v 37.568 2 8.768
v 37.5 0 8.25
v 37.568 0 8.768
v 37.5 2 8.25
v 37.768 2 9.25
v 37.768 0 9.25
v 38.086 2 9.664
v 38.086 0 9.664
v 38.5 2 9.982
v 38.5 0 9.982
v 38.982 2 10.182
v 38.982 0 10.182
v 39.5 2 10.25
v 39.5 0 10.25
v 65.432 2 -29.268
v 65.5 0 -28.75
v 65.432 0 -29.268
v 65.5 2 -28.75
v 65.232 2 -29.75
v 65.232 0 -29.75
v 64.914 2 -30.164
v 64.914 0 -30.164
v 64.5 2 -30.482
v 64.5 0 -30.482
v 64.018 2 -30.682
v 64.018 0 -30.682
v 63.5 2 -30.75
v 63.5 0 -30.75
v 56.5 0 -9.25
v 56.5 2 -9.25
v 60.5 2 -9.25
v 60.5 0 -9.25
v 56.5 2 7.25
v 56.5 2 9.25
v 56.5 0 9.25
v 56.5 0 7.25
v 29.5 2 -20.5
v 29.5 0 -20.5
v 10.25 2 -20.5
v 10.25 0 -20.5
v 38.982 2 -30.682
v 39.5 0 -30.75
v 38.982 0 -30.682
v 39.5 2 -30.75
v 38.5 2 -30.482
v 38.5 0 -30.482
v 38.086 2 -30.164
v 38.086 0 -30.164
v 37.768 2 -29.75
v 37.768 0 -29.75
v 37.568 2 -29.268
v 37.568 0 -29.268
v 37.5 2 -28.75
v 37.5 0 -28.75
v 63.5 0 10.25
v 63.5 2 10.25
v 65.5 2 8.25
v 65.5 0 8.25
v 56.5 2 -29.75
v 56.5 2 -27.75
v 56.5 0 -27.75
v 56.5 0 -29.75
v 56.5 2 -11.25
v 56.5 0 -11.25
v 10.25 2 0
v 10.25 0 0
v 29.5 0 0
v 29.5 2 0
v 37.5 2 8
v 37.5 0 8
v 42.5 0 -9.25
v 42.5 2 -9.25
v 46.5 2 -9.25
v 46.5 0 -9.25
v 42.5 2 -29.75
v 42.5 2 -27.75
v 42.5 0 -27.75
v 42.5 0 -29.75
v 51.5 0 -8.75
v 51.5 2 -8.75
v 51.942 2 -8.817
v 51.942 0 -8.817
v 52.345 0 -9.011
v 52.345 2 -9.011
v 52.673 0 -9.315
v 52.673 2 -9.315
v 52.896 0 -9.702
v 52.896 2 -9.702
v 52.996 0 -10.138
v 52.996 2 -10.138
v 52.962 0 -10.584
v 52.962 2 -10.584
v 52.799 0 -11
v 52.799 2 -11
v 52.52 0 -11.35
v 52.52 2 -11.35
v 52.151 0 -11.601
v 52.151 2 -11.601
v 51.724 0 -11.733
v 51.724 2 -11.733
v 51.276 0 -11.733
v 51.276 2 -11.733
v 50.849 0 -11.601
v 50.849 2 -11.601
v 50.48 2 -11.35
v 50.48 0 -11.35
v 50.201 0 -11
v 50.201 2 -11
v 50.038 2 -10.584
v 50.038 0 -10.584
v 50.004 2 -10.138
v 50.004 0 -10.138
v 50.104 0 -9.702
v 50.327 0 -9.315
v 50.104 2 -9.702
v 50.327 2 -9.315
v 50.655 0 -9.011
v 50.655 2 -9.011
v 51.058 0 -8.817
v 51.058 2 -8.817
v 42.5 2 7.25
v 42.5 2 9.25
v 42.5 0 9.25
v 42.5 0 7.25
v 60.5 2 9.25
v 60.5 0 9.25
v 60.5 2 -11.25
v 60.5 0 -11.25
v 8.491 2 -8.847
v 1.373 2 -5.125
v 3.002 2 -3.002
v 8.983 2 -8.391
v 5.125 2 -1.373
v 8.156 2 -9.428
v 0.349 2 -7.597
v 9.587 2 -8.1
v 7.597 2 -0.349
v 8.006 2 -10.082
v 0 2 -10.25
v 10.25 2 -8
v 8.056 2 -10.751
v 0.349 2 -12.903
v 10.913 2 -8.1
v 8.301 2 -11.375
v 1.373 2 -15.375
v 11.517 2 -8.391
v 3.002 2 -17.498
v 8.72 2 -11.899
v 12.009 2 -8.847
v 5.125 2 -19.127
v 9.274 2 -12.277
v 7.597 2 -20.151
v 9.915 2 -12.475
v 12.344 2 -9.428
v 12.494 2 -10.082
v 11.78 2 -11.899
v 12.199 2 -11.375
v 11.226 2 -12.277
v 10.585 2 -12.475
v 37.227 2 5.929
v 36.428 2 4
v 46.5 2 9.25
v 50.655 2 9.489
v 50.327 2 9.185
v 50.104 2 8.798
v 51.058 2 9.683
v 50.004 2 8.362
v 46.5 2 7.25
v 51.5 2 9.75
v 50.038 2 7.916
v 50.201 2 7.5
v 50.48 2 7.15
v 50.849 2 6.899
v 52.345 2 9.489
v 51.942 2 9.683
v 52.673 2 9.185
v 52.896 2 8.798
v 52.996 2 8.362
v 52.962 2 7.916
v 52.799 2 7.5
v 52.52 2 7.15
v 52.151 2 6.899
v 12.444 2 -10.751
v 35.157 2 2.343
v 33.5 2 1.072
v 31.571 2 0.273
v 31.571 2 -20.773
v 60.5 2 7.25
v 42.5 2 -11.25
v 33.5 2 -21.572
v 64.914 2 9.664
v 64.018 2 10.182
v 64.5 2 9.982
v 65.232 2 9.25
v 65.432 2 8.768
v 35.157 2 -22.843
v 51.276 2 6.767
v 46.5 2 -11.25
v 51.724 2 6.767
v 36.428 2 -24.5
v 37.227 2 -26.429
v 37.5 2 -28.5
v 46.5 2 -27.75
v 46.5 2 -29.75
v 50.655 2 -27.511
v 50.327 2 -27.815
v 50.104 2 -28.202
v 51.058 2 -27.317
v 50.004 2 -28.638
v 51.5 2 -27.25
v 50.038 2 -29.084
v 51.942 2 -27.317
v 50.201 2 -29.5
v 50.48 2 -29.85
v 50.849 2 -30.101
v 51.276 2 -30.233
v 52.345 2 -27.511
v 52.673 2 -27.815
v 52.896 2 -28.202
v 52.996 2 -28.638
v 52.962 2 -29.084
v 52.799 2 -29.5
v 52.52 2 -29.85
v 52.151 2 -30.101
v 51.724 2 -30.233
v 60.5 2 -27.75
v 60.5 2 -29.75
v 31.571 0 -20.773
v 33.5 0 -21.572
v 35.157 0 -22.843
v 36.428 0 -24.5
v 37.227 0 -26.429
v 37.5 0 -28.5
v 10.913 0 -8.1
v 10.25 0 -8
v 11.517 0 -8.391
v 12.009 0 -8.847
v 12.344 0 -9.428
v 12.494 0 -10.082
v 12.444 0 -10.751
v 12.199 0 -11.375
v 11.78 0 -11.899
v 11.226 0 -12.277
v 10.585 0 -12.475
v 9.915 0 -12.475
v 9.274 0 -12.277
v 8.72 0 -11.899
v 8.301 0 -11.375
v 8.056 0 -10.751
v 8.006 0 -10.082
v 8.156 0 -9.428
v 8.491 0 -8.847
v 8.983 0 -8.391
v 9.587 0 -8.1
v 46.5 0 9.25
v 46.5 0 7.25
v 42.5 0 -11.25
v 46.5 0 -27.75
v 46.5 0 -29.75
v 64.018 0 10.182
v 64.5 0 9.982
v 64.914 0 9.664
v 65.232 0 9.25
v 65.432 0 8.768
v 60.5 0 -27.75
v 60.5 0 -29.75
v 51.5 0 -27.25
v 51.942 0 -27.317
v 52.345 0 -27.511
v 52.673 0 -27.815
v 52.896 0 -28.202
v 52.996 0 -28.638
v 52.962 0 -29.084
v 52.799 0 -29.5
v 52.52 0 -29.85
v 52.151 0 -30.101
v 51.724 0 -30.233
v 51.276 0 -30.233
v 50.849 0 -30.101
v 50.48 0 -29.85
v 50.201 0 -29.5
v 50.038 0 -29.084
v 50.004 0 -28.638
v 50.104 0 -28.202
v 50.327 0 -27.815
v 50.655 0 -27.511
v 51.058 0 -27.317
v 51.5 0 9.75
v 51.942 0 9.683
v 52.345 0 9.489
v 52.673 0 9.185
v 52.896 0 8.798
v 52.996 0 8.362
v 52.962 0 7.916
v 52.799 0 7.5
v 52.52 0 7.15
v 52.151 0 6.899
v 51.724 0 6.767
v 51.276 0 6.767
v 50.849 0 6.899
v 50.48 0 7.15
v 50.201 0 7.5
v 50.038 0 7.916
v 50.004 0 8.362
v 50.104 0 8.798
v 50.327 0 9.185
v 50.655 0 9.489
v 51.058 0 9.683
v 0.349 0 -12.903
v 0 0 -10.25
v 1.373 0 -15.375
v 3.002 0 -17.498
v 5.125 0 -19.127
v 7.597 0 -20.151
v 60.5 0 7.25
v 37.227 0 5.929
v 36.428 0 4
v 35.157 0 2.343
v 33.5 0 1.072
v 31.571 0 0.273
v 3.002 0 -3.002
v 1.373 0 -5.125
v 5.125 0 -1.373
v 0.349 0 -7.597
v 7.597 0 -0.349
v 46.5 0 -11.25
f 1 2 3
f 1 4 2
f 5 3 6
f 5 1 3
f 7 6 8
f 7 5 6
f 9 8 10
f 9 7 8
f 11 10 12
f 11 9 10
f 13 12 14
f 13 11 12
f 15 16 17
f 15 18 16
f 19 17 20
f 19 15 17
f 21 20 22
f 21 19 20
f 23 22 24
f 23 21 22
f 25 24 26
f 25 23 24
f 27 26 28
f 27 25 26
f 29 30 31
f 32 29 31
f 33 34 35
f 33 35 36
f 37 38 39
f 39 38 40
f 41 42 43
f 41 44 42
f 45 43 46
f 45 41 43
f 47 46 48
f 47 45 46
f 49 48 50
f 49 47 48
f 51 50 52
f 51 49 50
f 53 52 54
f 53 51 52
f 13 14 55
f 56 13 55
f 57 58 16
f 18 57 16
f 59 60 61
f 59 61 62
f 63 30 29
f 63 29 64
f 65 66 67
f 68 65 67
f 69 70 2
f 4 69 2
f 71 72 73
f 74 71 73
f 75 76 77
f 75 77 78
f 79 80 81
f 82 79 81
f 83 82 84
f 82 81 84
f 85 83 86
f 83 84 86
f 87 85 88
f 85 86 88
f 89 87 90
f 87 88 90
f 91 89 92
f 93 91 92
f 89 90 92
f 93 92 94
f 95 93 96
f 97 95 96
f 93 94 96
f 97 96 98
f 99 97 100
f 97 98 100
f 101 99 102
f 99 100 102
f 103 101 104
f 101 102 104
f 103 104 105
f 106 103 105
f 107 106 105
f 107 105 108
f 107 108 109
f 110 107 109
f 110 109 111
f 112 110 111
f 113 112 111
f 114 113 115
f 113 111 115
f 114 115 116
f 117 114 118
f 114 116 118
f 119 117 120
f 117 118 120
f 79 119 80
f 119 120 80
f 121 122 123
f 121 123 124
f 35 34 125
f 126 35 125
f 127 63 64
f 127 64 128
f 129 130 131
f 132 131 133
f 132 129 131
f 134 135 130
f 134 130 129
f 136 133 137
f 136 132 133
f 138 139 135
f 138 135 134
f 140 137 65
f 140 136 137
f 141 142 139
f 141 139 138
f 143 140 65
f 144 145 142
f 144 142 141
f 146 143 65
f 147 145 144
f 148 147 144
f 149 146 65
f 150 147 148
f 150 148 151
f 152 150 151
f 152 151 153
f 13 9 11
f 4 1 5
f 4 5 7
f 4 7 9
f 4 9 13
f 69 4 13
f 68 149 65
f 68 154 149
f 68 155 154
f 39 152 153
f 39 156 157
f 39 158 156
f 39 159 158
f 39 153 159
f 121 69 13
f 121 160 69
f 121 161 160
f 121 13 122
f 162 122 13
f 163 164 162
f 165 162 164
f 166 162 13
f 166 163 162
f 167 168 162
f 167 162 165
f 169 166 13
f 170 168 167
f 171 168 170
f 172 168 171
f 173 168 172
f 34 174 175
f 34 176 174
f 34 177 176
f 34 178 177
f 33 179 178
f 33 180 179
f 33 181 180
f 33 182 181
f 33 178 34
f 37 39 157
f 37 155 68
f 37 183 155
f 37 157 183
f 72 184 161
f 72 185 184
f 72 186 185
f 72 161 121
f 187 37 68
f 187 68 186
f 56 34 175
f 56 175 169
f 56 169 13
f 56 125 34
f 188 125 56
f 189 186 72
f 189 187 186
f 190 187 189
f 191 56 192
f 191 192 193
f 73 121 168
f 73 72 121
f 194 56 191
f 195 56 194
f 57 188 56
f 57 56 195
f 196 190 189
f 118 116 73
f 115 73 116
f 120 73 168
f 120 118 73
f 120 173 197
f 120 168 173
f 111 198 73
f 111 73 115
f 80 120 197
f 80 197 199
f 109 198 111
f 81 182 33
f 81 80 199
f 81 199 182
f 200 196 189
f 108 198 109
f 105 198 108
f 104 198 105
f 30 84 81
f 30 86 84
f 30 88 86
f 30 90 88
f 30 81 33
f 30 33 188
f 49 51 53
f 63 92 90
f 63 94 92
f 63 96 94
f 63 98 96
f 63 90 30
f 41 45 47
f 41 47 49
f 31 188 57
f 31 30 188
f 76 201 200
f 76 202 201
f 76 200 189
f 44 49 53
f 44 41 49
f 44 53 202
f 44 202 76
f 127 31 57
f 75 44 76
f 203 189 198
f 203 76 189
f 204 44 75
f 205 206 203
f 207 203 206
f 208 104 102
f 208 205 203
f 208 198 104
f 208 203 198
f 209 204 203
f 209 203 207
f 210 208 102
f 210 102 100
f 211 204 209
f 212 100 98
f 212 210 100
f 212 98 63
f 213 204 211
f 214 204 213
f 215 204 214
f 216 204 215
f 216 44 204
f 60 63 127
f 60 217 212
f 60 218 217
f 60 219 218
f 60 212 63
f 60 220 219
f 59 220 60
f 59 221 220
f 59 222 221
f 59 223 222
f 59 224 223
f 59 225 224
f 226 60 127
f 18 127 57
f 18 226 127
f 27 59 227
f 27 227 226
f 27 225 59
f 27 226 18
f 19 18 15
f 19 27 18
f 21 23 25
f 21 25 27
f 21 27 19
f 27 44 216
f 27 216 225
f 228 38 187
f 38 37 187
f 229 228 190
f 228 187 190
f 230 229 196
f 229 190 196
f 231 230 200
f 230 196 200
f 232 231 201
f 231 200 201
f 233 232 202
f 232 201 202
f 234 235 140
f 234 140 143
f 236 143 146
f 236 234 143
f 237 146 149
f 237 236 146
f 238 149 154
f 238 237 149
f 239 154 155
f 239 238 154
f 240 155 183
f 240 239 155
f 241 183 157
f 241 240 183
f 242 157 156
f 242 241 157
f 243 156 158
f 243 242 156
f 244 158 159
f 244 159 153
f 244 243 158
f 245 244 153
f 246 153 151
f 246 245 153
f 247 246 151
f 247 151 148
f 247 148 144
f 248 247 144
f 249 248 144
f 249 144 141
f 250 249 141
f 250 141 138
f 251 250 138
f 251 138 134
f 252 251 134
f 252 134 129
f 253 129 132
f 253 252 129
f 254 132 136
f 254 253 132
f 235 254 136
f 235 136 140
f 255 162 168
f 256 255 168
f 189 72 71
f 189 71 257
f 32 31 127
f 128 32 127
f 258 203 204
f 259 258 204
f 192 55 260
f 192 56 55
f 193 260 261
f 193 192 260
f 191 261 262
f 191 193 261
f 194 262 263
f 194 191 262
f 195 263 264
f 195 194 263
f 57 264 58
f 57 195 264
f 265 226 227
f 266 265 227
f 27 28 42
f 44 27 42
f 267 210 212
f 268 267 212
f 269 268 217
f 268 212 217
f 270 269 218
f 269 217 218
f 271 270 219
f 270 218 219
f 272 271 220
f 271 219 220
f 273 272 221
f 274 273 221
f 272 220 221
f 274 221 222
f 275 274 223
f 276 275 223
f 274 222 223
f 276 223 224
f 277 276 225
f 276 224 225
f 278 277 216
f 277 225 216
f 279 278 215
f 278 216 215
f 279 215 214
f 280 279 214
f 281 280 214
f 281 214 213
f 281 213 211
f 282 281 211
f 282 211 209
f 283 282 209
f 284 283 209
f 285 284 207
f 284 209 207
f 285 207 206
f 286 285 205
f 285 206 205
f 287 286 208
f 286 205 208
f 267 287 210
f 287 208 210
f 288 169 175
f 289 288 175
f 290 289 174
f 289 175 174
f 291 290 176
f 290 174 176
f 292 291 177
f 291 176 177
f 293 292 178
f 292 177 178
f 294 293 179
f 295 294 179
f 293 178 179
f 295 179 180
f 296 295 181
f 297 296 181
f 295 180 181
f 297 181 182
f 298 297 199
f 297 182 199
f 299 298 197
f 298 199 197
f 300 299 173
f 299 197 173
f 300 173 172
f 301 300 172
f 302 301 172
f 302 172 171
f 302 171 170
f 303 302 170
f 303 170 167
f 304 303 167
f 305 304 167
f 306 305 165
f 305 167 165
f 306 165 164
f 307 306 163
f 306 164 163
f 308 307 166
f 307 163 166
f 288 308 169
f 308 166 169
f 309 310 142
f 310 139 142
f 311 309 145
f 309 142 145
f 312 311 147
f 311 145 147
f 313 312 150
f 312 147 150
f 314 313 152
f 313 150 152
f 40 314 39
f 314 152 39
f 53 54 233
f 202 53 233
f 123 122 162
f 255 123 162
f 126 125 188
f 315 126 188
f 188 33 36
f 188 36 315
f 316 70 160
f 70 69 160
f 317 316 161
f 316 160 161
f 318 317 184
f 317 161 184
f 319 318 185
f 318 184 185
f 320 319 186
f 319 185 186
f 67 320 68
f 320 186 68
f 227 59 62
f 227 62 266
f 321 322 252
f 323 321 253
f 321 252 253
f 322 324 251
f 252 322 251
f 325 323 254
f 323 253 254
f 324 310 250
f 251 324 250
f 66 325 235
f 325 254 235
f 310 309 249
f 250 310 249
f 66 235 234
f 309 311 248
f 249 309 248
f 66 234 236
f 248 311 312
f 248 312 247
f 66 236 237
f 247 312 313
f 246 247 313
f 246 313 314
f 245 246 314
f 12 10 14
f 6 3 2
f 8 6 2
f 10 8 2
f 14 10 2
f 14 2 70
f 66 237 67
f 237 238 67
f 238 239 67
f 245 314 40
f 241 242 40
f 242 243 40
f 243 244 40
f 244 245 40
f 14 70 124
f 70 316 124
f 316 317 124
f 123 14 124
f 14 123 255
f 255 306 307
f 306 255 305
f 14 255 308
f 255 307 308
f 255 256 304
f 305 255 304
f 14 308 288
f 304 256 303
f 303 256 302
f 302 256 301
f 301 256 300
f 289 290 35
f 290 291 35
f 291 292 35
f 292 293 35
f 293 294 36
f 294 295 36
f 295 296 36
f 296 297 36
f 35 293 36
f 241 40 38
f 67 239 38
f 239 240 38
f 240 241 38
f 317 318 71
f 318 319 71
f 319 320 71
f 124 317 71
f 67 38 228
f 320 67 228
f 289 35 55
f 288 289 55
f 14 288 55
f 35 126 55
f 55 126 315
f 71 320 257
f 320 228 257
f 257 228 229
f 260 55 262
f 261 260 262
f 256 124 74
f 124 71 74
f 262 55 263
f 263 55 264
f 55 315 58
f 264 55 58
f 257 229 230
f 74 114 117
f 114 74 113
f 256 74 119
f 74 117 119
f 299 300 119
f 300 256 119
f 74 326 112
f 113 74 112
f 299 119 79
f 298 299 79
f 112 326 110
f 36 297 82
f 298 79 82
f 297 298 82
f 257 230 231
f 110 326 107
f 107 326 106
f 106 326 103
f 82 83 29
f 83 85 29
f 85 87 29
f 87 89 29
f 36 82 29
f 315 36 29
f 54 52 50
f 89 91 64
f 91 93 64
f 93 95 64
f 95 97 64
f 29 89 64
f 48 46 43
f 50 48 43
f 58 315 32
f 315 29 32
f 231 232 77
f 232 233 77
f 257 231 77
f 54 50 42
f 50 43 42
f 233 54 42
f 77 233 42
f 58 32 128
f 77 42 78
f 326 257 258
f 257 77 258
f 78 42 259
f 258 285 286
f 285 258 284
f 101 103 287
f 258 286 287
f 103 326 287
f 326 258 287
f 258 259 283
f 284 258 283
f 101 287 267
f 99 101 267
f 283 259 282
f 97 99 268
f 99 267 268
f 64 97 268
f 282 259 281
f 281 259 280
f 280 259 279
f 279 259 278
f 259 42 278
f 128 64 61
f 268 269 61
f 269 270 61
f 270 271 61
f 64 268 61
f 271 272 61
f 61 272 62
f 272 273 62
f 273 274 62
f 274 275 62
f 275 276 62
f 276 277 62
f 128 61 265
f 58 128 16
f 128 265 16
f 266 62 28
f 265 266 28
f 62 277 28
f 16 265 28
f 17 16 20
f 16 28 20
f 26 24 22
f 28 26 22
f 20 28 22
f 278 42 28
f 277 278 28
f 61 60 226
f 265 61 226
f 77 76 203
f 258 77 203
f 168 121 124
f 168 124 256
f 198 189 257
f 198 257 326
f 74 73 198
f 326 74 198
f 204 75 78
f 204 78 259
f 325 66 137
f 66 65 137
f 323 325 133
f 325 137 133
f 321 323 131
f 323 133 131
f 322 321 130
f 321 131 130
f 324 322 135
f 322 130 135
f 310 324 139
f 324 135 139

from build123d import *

# Parameters (mm, degrees)
SKETCH1_R           = 2.25
BOSS_EXTRUDE1_DEPTH = 2
FILLET1_R           = 10.25
FILLET2_R           = 2
SKETCH2_R           = 1.5
SKETCH2_W           = 4
SKETCH2_H           = 2
CUT_EXTRUDE1_DEPTH  = 2
FILLET3_R           = 8


with BuildPart() as part:
    # Sketch1 → Boss-Extrude1 (new body)
    with BuildSketch(Plane(origin=(0, 0, 0), x_dir=(1, 0, 0), z_dir=(0, 1, 0))):
        Polygon((0, 0), (37.5, 0), (37.5, -10.25), (65.5, -10.25), (65.5, -0.75), (65.5, 21.25), (65.5, 30.75), (37.5, 30.75), (37.5, 20.5), (0, 20.5), align=None)
        with Locations(Location((10.25, 10.25, 0), (0, 0, 270))):
            Circle(SKETCH1_R, mode=Mode.SUBTRACT)
    extrude(amount=BOSS_EXTRUDE1_DEPTH)

    # Fillet1
    fillet1_edges = [part.edges().sort_by_distance(p)[0] for p in [
        (0, 1, -20.5),
        (0, 1, 0),
    ]]
    fillet(fillet1_edges, radius=FILLET1_R - 0.0001)  # a hair under: the kernel refuses the full size

    # Fillet2
    fillet2_edges = [part.edges().sort_by_distance(p)[0] for p in [
        (37.5, 1, -30.75),
        (65.5, 1, -30.75),
        (65.5, 1, 10.25),
        (37.5, 1, 10.25),
    ]]
    fillet(fillet2_edges, radius=FILLET2_R)

    # Sketch2 → Cut-Extrude1 (cut)
    with BuildSketch(Plane(origin=(0, 2, 0), x_dir=(1, 0, 0), z_dir=(0, 1, 0))):
        with Locations(Location((51.5, 28.75, 0), (0, 0, 270))):
            Circle(SKETCH2_R)
        with Locations(Location((51.5, 10.25, 0), (0, 0, 270))):
            Circle(SKETCH2_R)
        with Locations(Location((51.5, -8.25, 0), (0, 0, 270))):
            Circle(SKETCH2_R)
        with Locations((44.5, 28.75)):
            Rectangle(SKETCH2_W, SKETCH2_H)
        with Locations((58.5, 28.75)):
            Rectangle(SKETCH2_W, SKETCH2_H)
        with Locations((44.5, 10.25)):
            Rectangle(SKETCH2_W, SKETCH2_H)
        with Locations((58.5, 10.25)):
            Rectangle(SKETCH2_W, SKETCH2_H)
        with Locations((44.5, -8.25)):
            Rectangle(SKETCH2_W, SKETCH2_H)
        with Locations((58.5, -8.25)):
            Rectangle(SKETCH2_W, SKETCH2_H)
    extrude(amount=-CUT_EXTRUDE1_DEPTH, mode=Mode.SUBTRACT)

    # Fillet3
    fillet3_edges = [part.edges().sort_by_distance(p)[0] for p in [
        (37.5, 1, -20.5),
        (37.5, 1, 0),
    ]]
    fillet(fillet3_edges, radius=FILLET3_R)


solid = part.part
